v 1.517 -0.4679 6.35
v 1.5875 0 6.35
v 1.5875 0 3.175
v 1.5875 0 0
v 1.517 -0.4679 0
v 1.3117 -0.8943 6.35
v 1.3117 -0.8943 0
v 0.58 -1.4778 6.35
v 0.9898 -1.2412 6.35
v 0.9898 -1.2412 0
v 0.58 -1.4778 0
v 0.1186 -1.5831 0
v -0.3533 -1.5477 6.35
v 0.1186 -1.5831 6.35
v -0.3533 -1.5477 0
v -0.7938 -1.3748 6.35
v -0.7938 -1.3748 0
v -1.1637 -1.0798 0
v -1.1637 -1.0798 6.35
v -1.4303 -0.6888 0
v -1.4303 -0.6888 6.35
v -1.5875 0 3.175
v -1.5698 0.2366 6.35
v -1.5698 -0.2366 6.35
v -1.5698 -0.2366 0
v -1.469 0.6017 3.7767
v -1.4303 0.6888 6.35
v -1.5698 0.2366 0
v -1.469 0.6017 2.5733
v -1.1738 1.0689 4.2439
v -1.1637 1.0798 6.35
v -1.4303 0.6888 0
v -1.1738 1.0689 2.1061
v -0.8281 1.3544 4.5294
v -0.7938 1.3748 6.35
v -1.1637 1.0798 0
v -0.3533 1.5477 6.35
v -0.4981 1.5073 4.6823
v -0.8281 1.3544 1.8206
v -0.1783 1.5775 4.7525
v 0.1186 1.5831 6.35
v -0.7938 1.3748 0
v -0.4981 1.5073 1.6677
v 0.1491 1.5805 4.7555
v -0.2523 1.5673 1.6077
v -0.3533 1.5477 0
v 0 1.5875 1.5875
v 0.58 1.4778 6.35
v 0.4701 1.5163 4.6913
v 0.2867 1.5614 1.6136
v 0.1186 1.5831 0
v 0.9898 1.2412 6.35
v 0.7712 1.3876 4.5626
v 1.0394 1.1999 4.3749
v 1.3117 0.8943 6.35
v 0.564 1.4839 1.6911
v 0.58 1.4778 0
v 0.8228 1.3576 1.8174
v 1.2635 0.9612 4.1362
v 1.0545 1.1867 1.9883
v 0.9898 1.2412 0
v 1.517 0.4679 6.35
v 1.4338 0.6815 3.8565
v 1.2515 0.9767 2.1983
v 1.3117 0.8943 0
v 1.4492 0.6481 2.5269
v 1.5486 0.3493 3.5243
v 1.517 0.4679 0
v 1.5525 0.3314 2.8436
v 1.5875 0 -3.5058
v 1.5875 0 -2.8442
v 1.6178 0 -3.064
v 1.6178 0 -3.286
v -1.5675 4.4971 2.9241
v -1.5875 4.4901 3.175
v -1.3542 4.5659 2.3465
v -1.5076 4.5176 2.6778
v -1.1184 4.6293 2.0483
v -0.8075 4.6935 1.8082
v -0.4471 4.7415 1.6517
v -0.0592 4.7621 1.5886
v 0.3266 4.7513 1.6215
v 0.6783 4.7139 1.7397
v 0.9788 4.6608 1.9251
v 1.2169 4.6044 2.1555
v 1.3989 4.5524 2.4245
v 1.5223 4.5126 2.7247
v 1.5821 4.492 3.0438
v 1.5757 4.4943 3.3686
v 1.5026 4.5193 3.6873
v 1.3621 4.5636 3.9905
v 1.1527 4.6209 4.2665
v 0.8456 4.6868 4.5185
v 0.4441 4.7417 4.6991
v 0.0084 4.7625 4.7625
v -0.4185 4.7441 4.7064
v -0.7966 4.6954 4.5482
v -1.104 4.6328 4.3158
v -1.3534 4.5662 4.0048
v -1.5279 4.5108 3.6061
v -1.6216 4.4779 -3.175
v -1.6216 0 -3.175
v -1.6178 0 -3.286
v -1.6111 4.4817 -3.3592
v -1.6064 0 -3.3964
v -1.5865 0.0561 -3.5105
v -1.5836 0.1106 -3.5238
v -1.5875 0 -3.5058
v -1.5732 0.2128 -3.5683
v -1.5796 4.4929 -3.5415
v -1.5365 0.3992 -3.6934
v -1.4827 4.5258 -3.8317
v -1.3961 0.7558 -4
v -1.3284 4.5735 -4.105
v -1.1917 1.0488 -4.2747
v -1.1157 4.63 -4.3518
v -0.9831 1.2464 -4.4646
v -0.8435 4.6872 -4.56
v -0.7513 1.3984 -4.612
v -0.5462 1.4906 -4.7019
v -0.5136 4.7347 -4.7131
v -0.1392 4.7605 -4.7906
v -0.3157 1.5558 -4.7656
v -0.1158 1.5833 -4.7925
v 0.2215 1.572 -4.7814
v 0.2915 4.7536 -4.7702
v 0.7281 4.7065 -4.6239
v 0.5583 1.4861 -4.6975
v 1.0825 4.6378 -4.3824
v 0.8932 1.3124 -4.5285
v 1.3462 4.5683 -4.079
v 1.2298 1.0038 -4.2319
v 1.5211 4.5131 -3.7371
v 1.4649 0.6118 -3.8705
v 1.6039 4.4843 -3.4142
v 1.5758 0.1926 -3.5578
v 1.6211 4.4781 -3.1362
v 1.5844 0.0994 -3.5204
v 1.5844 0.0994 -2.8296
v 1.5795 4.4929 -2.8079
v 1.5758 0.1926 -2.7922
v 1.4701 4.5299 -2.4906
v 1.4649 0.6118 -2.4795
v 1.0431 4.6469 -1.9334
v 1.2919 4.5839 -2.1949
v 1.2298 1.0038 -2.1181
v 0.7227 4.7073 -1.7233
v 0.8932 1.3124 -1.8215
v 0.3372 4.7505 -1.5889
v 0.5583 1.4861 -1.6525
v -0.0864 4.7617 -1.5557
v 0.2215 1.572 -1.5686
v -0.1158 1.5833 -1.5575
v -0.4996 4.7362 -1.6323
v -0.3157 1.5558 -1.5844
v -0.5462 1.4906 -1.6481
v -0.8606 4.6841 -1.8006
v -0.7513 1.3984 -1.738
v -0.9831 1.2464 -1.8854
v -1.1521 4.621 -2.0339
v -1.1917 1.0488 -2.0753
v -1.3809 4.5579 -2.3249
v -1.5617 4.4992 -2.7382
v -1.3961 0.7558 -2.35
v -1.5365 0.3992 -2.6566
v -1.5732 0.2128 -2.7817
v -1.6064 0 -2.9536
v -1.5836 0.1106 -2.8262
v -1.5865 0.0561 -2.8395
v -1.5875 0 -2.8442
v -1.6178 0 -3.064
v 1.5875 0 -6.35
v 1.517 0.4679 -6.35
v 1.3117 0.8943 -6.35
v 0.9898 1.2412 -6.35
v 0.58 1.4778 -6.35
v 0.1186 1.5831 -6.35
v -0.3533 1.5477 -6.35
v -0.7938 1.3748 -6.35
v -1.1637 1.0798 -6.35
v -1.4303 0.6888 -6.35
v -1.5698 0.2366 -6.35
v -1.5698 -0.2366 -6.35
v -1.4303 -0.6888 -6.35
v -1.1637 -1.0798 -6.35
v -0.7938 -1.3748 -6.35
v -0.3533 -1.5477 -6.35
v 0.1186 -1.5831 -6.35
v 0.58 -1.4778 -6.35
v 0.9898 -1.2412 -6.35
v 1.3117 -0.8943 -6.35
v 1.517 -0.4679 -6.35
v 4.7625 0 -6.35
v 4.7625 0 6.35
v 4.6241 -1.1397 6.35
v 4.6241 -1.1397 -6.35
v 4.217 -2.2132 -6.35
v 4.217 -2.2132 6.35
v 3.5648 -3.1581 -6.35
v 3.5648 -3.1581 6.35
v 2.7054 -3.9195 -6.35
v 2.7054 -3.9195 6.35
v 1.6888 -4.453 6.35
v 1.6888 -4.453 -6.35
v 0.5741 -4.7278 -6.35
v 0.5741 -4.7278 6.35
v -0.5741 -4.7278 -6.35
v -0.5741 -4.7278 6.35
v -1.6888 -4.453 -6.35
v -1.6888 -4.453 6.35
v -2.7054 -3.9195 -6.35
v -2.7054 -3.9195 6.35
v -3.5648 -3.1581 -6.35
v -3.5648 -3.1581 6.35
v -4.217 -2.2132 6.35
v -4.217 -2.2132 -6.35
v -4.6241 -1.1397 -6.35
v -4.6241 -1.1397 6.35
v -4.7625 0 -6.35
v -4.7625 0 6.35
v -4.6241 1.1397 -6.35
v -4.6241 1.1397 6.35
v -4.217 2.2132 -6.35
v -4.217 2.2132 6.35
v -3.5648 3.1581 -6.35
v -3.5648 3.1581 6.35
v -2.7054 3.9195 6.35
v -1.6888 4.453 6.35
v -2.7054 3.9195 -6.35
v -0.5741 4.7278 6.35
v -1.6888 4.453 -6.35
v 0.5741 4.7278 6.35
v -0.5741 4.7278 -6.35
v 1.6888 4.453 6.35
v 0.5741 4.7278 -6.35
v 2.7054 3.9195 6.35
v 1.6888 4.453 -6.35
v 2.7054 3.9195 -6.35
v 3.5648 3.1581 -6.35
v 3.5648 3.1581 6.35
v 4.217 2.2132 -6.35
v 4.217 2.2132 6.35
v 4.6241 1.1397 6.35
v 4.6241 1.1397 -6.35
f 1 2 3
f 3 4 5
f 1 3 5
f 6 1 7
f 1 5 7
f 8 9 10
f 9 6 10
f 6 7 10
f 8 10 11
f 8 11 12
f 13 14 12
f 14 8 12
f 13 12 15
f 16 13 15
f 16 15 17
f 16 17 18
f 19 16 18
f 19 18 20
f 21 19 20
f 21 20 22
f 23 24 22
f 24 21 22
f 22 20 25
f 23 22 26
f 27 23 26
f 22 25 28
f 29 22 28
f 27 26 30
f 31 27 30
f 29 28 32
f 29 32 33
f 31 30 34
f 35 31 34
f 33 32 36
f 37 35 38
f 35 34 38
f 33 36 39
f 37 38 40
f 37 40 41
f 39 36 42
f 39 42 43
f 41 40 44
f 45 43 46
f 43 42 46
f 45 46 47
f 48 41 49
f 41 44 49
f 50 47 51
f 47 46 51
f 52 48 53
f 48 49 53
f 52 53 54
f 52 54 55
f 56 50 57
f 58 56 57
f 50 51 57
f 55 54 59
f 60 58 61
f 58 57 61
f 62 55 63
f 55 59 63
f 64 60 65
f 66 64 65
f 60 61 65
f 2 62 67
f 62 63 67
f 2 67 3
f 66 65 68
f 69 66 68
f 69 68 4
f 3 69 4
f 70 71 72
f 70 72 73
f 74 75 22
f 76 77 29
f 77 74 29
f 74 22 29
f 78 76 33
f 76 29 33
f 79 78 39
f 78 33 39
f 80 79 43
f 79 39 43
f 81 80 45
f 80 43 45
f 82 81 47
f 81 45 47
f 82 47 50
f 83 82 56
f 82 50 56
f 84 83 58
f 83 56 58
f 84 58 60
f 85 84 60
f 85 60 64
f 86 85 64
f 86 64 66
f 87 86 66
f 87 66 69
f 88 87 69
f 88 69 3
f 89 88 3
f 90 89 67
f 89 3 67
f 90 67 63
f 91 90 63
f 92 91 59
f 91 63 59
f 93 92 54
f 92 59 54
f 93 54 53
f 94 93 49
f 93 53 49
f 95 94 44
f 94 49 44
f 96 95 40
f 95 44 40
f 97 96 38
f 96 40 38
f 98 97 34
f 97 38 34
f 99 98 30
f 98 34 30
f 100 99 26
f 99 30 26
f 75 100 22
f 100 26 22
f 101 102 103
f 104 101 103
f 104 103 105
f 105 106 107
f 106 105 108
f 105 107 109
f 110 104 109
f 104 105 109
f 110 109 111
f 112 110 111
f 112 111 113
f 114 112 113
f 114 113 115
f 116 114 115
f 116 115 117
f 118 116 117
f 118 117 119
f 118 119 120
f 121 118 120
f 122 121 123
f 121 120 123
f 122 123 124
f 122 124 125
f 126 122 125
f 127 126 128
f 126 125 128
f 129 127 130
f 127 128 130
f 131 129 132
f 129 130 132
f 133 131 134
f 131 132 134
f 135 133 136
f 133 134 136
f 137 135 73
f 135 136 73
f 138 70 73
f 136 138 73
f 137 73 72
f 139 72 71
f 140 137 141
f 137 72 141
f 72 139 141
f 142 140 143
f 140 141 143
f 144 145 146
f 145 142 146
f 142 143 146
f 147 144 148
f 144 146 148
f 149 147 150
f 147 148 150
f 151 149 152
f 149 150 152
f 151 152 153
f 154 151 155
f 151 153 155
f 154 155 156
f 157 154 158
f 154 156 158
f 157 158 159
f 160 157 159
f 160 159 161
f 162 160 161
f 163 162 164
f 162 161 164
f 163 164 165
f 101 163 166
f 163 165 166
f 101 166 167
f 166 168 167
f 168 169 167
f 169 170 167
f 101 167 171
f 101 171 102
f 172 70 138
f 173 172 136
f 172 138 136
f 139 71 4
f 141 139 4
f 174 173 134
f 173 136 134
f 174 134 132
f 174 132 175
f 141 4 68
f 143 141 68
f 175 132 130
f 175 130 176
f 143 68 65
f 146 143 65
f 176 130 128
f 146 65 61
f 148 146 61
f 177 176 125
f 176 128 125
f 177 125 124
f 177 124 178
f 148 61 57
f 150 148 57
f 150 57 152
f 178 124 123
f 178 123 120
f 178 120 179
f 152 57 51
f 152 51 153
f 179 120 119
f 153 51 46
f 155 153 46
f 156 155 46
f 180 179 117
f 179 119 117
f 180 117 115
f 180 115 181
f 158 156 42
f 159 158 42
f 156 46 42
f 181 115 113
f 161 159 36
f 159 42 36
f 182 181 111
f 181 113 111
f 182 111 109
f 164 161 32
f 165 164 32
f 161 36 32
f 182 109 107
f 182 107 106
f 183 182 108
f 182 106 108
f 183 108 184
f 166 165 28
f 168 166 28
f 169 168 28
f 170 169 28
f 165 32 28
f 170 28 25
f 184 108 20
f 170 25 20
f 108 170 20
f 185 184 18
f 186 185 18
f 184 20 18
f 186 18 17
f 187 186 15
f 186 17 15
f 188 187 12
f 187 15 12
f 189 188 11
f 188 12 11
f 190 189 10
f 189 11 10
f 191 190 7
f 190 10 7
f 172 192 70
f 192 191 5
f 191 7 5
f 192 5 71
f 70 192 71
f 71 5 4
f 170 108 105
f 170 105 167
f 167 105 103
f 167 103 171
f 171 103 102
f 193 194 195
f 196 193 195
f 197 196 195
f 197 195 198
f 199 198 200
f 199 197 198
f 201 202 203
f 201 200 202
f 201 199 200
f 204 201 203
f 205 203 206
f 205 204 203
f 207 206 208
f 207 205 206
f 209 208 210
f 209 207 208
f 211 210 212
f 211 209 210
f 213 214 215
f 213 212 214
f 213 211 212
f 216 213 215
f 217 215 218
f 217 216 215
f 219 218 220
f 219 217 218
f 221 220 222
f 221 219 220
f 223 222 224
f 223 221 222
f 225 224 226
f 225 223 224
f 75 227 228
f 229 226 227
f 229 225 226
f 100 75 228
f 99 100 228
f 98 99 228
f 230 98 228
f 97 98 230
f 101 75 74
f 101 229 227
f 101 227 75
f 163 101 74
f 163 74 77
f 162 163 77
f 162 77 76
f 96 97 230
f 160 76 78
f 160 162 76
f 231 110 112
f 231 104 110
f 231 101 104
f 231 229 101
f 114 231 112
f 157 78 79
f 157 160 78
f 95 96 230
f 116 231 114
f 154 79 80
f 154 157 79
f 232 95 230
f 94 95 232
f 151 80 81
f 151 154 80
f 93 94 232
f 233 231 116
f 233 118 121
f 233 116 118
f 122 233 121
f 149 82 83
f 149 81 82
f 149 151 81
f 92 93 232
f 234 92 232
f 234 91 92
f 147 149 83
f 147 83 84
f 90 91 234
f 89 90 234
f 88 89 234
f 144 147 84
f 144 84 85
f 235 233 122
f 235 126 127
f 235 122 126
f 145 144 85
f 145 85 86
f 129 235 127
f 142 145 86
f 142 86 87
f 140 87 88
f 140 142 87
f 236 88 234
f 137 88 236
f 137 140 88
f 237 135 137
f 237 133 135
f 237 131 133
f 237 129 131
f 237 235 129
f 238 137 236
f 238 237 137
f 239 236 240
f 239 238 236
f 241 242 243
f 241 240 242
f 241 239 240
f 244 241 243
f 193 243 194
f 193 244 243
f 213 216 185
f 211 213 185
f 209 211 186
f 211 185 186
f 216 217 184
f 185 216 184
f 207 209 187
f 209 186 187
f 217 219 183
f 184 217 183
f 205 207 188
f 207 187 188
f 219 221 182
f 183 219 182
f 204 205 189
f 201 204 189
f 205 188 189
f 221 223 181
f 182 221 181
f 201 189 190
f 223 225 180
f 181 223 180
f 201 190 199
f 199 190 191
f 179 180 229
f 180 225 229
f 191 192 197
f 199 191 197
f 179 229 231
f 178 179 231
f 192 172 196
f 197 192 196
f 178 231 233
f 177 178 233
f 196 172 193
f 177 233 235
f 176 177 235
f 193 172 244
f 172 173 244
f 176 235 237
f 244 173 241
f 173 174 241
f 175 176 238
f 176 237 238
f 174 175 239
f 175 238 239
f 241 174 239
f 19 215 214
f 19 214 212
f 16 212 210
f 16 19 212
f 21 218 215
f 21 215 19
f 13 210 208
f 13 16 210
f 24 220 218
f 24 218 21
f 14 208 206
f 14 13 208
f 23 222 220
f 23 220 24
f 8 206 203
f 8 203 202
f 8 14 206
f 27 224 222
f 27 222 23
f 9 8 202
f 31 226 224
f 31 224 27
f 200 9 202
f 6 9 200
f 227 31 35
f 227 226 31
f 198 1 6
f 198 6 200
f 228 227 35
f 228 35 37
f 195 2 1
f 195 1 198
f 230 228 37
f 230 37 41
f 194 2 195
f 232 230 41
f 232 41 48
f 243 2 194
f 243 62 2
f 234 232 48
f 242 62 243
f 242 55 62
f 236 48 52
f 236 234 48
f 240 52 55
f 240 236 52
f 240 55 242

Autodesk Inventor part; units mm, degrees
ref_plane "YZ Plane" through (0, 0, 0) normal (1, 0, 0) x (0, 1, 0)
ref_plane "XZ Plane" through (0, 0, 0) normal (0, 1, 0) x (-1, 0, 0)
ref_plane "XY Plane" through (0, 0, 0) normal (0, 0, 1) x (1, 0, 0)
sketch "Sketch1" plane through (0, 0, 0) normal (0, 0, 1) x (1, 0, 0)
  circle A0 centre (0, 0) radius 1.5875
  circle A1 centre (0, 0) radius 4.7625
  dimension "d1" = 3.175
  dimension "d2" = 9.525
extrude "Extrusion1" add sketch "Sketch1" along normal mid plane 12.7
sketch "Sketch2" plane through (0, 0, 0) normal (0, 1, 0) x (-1, 0, 0)
  circle A0 centre (0, 3.175) radius 1.5875
  circle A1 centre (0, -3.175) radius 1.6216
  point P0 (0, 0)
  dimension "d5" = 3.175
  dimension "d6" = 3.175
  dimension "d7" = 3.175
extrude "Extrusion2" cut sketch "Sketch2" along normal blind 7.9375
properties part number "coupler" material "ABS Plastic"
